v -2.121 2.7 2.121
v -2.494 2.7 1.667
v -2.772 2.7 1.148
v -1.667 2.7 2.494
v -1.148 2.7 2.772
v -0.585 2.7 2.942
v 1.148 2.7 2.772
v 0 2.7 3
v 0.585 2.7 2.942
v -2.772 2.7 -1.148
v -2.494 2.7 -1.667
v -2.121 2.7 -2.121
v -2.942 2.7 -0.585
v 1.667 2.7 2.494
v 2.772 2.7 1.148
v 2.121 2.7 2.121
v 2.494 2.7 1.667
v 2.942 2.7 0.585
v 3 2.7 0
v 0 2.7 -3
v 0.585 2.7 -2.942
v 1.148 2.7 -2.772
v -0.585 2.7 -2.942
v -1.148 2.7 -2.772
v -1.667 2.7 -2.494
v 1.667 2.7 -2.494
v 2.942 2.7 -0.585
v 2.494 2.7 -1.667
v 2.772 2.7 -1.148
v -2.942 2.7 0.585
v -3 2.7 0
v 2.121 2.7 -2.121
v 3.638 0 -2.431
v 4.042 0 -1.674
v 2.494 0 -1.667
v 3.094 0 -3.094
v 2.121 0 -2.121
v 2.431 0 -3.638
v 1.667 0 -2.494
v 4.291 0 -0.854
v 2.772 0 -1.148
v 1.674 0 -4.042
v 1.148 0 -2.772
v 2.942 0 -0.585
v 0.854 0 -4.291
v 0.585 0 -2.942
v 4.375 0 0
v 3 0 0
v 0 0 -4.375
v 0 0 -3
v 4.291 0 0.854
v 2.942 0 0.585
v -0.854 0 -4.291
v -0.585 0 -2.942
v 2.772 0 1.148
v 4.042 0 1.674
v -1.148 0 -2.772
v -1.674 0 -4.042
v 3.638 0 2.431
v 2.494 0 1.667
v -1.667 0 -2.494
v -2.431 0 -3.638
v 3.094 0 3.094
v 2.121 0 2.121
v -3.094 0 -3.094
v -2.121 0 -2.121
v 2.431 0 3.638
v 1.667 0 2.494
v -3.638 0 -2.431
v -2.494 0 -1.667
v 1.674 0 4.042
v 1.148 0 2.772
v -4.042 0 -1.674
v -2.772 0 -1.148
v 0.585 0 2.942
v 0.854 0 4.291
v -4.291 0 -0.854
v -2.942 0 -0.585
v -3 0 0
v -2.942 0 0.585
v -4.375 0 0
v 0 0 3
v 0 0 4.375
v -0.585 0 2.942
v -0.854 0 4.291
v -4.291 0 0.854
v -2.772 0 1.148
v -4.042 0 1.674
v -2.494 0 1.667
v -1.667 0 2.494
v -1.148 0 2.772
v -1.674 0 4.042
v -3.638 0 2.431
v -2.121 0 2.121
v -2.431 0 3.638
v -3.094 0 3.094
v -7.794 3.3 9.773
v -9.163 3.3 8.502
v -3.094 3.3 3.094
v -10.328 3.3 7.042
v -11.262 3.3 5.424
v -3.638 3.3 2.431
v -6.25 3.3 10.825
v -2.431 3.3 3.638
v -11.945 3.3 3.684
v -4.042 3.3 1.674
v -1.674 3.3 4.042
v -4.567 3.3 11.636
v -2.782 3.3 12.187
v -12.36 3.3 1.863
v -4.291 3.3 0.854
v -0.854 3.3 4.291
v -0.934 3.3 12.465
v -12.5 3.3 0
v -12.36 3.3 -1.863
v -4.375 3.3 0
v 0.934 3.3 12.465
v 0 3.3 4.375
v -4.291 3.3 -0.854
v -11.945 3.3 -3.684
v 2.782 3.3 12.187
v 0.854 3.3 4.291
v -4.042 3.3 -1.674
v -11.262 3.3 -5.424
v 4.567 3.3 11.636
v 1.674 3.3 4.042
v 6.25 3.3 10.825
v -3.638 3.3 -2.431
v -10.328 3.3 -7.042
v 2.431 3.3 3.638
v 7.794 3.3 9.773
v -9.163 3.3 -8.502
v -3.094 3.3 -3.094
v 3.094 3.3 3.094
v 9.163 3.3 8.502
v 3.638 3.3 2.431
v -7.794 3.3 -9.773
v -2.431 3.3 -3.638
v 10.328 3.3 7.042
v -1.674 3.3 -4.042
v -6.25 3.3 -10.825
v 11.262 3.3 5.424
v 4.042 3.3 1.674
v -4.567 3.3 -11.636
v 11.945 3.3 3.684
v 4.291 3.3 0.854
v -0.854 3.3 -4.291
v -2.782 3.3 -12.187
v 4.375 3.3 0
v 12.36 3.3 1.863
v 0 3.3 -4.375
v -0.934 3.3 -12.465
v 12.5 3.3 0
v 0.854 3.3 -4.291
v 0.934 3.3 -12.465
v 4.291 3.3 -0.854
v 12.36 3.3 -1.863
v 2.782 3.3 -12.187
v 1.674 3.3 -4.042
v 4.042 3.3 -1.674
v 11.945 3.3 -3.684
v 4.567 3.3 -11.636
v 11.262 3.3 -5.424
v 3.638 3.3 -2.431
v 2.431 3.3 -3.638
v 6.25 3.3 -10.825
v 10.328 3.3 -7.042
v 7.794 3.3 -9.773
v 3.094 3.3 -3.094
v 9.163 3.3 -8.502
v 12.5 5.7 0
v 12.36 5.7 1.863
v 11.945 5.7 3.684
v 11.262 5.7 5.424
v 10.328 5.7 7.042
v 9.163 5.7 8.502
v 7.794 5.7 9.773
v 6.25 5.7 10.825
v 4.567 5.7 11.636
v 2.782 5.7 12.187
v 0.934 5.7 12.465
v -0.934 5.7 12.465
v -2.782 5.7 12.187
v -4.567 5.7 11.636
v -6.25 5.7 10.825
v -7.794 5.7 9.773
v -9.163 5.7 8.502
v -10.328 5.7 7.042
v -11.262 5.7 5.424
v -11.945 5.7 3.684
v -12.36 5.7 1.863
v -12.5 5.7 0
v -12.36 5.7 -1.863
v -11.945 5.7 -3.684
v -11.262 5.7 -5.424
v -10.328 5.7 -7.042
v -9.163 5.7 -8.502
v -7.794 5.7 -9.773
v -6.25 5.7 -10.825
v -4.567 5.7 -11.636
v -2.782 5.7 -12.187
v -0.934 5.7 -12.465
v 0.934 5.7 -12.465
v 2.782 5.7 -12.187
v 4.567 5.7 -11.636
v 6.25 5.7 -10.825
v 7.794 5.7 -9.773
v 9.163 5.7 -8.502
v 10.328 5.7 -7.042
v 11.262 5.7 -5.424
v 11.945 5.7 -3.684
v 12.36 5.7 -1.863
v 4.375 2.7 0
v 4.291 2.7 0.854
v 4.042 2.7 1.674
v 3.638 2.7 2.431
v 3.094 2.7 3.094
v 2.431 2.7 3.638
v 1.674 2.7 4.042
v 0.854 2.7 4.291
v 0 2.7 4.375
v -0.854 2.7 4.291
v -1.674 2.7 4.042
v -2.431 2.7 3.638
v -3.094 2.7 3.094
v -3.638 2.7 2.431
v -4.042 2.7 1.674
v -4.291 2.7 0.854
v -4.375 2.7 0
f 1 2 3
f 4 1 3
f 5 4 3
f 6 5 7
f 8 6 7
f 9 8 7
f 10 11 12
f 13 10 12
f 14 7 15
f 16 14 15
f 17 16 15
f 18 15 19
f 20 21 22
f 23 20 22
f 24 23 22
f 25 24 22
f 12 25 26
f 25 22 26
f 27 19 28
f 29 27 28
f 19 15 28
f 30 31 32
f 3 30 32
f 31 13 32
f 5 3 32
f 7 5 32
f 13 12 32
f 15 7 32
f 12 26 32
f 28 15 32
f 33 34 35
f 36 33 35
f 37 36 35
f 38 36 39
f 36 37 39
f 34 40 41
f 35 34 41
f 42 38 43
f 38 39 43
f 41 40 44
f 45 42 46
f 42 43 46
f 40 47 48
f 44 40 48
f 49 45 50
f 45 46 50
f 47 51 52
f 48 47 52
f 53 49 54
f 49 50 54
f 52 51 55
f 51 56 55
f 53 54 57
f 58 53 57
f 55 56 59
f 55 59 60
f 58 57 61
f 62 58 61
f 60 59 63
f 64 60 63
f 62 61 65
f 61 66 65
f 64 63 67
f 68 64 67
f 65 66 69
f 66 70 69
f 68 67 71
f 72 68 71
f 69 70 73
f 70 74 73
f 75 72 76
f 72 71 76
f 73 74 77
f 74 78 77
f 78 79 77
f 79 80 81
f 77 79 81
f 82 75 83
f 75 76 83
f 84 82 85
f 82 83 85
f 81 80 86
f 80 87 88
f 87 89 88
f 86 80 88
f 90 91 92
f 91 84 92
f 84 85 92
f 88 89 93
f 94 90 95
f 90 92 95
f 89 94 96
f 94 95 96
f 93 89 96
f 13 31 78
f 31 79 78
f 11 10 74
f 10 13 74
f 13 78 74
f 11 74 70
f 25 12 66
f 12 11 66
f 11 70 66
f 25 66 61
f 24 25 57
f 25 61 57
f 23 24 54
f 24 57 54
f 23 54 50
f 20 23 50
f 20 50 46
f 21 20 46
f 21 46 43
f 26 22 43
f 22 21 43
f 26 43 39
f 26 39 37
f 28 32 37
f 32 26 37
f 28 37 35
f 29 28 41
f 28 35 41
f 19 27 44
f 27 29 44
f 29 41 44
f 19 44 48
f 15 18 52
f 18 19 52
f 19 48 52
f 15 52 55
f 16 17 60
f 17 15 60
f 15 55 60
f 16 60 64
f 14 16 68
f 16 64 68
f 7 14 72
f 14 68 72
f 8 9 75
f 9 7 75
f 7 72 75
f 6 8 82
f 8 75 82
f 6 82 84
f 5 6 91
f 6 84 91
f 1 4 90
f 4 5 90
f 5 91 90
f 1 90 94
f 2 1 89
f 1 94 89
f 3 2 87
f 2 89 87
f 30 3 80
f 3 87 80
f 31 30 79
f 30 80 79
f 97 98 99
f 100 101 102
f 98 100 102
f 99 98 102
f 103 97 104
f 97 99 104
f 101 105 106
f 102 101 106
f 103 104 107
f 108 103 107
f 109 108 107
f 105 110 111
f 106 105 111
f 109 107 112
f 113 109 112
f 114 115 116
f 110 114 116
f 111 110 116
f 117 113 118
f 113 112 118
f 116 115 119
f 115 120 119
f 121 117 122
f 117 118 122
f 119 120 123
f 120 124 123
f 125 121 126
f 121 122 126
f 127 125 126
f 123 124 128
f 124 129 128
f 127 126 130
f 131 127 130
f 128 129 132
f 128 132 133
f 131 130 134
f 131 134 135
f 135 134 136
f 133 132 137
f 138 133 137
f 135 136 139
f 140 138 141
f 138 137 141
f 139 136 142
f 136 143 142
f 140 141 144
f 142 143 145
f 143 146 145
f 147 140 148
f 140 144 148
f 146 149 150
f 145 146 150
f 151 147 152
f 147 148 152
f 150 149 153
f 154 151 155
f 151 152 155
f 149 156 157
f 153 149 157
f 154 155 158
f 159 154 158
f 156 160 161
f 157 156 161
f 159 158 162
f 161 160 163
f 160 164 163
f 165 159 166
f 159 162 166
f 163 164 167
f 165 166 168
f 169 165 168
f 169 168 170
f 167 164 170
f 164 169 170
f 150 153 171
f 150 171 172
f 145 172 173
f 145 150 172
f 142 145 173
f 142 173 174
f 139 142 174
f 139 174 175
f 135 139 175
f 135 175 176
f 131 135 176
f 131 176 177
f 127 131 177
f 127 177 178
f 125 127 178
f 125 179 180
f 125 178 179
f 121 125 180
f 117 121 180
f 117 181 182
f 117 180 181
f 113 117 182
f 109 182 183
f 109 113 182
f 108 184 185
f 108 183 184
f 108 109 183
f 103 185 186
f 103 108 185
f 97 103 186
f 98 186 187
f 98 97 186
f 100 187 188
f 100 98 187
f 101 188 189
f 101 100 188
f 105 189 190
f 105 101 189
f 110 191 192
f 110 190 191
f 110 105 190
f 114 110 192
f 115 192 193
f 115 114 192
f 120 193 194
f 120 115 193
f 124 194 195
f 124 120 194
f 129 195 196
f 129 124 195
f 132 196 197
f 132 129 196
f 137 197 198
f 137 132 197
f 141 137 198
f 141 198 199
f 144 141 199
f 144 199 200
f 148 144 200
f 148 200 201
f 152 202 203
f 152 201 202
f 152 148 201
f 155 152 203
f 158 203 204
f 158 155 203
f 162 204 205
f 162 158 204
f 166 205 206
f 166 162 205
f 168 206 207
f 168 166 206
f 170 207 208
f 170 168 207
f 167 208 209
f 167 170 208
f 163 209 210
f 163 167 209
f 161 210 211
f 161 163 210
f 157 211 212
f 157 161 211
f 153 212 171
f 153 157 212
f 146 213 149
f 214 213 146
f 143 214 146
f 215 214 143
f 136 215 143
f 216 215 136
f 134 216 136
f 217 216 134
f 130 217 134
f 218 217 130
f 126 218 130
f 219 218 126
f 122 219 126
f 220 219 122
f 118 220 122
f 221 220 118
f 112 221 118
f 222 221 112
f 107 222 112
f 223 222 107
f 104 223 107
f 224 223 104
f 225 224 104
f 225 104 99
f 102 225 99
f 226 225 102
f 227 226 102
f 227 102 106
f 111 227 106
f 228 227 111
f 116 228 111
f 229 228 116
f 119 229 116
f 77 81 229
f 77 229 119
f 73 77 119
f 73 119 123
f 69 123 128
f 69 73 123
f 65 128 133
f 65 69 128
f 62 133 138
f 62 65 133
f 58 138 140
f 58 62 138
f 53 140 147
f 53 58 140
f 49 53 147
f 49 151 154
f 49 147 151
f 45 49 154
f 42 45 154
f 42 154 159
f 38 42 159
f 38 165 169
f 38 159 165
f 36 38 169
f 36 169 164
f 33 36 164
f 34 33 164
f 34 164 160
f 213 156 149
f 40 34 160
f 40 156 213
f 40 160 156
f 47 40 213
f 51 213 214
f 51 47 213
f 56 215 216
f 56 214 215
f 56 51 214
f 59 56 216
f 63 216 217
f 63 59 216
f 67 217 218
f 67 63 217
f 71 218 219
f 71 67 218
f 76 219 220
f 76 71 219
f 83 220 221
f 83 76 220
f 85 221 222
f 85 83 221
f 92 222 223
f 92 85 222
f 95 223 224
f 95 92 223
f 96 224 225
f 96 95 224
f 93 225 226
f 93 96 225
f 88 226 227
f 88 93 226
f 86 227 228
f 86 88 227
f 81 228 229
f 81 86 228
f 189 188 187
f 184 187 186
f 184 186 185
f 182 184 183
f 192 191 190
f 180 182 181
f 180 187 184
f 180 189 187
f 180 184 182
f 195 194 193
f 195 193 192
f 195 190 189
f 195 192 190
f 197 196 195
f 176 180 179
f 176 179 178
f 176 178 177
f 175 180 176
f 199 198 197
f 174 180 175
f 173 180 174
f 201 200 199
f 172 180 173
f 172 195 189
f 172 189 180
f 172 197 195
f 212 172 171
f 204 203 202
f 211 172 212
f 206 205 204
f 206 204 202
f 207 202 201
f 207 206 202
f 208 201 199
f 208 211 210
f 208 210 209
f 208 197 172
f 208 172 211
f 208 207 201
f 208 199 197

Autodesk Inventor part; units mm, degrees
ref_plane "YZ Plane" through (0, 0, 0) normal (1, 0, 0) x (0, 1, 0)
ref_plane "XZ Plane" through (0, 0, 0) normal (0, 1, 0) x (-1, 0, 0)
ref_plane "XY Plane" through (0, 0, 0) normal (0, 0, 1) x (1, 0, 0)
sketch "Sketch1" plane through (0, 0, 0) normal (0, 1, 0) x (-1, 0, 0)
  circle A0 centre (0, 0) radius 3
  circle A1 centre (0, 0) radius 4.375
  dimension "d0" = 6
  dimension "d1" = 8.75
extrude "Extrusion1" add sketch "Sketch1" along normal blind 2.7
sketch "Sketch2" plane through (0, 2.7, 0) normal (0, 1, 0) x (1, 0, 0)
  circle A0 centre (0, 0) radius 3 projected
  circle A1 centre (0, 0) radius 4.375
extrude "Extrusion2" add sketch "Sketch2" along normal blind 0.6 contours A0 | A1
sketch "Sketch3" plane through (0, 3.3, 0) normal (0, 1, 0) x (1, 0, 0)
  circle A0 centre (0, 0) radius 12.5
  dimension "d9" = 25
extrude "Extrusion3" add sketch "Sketch3" along normal blind 2.4
properties part number "Estella Servo1"
